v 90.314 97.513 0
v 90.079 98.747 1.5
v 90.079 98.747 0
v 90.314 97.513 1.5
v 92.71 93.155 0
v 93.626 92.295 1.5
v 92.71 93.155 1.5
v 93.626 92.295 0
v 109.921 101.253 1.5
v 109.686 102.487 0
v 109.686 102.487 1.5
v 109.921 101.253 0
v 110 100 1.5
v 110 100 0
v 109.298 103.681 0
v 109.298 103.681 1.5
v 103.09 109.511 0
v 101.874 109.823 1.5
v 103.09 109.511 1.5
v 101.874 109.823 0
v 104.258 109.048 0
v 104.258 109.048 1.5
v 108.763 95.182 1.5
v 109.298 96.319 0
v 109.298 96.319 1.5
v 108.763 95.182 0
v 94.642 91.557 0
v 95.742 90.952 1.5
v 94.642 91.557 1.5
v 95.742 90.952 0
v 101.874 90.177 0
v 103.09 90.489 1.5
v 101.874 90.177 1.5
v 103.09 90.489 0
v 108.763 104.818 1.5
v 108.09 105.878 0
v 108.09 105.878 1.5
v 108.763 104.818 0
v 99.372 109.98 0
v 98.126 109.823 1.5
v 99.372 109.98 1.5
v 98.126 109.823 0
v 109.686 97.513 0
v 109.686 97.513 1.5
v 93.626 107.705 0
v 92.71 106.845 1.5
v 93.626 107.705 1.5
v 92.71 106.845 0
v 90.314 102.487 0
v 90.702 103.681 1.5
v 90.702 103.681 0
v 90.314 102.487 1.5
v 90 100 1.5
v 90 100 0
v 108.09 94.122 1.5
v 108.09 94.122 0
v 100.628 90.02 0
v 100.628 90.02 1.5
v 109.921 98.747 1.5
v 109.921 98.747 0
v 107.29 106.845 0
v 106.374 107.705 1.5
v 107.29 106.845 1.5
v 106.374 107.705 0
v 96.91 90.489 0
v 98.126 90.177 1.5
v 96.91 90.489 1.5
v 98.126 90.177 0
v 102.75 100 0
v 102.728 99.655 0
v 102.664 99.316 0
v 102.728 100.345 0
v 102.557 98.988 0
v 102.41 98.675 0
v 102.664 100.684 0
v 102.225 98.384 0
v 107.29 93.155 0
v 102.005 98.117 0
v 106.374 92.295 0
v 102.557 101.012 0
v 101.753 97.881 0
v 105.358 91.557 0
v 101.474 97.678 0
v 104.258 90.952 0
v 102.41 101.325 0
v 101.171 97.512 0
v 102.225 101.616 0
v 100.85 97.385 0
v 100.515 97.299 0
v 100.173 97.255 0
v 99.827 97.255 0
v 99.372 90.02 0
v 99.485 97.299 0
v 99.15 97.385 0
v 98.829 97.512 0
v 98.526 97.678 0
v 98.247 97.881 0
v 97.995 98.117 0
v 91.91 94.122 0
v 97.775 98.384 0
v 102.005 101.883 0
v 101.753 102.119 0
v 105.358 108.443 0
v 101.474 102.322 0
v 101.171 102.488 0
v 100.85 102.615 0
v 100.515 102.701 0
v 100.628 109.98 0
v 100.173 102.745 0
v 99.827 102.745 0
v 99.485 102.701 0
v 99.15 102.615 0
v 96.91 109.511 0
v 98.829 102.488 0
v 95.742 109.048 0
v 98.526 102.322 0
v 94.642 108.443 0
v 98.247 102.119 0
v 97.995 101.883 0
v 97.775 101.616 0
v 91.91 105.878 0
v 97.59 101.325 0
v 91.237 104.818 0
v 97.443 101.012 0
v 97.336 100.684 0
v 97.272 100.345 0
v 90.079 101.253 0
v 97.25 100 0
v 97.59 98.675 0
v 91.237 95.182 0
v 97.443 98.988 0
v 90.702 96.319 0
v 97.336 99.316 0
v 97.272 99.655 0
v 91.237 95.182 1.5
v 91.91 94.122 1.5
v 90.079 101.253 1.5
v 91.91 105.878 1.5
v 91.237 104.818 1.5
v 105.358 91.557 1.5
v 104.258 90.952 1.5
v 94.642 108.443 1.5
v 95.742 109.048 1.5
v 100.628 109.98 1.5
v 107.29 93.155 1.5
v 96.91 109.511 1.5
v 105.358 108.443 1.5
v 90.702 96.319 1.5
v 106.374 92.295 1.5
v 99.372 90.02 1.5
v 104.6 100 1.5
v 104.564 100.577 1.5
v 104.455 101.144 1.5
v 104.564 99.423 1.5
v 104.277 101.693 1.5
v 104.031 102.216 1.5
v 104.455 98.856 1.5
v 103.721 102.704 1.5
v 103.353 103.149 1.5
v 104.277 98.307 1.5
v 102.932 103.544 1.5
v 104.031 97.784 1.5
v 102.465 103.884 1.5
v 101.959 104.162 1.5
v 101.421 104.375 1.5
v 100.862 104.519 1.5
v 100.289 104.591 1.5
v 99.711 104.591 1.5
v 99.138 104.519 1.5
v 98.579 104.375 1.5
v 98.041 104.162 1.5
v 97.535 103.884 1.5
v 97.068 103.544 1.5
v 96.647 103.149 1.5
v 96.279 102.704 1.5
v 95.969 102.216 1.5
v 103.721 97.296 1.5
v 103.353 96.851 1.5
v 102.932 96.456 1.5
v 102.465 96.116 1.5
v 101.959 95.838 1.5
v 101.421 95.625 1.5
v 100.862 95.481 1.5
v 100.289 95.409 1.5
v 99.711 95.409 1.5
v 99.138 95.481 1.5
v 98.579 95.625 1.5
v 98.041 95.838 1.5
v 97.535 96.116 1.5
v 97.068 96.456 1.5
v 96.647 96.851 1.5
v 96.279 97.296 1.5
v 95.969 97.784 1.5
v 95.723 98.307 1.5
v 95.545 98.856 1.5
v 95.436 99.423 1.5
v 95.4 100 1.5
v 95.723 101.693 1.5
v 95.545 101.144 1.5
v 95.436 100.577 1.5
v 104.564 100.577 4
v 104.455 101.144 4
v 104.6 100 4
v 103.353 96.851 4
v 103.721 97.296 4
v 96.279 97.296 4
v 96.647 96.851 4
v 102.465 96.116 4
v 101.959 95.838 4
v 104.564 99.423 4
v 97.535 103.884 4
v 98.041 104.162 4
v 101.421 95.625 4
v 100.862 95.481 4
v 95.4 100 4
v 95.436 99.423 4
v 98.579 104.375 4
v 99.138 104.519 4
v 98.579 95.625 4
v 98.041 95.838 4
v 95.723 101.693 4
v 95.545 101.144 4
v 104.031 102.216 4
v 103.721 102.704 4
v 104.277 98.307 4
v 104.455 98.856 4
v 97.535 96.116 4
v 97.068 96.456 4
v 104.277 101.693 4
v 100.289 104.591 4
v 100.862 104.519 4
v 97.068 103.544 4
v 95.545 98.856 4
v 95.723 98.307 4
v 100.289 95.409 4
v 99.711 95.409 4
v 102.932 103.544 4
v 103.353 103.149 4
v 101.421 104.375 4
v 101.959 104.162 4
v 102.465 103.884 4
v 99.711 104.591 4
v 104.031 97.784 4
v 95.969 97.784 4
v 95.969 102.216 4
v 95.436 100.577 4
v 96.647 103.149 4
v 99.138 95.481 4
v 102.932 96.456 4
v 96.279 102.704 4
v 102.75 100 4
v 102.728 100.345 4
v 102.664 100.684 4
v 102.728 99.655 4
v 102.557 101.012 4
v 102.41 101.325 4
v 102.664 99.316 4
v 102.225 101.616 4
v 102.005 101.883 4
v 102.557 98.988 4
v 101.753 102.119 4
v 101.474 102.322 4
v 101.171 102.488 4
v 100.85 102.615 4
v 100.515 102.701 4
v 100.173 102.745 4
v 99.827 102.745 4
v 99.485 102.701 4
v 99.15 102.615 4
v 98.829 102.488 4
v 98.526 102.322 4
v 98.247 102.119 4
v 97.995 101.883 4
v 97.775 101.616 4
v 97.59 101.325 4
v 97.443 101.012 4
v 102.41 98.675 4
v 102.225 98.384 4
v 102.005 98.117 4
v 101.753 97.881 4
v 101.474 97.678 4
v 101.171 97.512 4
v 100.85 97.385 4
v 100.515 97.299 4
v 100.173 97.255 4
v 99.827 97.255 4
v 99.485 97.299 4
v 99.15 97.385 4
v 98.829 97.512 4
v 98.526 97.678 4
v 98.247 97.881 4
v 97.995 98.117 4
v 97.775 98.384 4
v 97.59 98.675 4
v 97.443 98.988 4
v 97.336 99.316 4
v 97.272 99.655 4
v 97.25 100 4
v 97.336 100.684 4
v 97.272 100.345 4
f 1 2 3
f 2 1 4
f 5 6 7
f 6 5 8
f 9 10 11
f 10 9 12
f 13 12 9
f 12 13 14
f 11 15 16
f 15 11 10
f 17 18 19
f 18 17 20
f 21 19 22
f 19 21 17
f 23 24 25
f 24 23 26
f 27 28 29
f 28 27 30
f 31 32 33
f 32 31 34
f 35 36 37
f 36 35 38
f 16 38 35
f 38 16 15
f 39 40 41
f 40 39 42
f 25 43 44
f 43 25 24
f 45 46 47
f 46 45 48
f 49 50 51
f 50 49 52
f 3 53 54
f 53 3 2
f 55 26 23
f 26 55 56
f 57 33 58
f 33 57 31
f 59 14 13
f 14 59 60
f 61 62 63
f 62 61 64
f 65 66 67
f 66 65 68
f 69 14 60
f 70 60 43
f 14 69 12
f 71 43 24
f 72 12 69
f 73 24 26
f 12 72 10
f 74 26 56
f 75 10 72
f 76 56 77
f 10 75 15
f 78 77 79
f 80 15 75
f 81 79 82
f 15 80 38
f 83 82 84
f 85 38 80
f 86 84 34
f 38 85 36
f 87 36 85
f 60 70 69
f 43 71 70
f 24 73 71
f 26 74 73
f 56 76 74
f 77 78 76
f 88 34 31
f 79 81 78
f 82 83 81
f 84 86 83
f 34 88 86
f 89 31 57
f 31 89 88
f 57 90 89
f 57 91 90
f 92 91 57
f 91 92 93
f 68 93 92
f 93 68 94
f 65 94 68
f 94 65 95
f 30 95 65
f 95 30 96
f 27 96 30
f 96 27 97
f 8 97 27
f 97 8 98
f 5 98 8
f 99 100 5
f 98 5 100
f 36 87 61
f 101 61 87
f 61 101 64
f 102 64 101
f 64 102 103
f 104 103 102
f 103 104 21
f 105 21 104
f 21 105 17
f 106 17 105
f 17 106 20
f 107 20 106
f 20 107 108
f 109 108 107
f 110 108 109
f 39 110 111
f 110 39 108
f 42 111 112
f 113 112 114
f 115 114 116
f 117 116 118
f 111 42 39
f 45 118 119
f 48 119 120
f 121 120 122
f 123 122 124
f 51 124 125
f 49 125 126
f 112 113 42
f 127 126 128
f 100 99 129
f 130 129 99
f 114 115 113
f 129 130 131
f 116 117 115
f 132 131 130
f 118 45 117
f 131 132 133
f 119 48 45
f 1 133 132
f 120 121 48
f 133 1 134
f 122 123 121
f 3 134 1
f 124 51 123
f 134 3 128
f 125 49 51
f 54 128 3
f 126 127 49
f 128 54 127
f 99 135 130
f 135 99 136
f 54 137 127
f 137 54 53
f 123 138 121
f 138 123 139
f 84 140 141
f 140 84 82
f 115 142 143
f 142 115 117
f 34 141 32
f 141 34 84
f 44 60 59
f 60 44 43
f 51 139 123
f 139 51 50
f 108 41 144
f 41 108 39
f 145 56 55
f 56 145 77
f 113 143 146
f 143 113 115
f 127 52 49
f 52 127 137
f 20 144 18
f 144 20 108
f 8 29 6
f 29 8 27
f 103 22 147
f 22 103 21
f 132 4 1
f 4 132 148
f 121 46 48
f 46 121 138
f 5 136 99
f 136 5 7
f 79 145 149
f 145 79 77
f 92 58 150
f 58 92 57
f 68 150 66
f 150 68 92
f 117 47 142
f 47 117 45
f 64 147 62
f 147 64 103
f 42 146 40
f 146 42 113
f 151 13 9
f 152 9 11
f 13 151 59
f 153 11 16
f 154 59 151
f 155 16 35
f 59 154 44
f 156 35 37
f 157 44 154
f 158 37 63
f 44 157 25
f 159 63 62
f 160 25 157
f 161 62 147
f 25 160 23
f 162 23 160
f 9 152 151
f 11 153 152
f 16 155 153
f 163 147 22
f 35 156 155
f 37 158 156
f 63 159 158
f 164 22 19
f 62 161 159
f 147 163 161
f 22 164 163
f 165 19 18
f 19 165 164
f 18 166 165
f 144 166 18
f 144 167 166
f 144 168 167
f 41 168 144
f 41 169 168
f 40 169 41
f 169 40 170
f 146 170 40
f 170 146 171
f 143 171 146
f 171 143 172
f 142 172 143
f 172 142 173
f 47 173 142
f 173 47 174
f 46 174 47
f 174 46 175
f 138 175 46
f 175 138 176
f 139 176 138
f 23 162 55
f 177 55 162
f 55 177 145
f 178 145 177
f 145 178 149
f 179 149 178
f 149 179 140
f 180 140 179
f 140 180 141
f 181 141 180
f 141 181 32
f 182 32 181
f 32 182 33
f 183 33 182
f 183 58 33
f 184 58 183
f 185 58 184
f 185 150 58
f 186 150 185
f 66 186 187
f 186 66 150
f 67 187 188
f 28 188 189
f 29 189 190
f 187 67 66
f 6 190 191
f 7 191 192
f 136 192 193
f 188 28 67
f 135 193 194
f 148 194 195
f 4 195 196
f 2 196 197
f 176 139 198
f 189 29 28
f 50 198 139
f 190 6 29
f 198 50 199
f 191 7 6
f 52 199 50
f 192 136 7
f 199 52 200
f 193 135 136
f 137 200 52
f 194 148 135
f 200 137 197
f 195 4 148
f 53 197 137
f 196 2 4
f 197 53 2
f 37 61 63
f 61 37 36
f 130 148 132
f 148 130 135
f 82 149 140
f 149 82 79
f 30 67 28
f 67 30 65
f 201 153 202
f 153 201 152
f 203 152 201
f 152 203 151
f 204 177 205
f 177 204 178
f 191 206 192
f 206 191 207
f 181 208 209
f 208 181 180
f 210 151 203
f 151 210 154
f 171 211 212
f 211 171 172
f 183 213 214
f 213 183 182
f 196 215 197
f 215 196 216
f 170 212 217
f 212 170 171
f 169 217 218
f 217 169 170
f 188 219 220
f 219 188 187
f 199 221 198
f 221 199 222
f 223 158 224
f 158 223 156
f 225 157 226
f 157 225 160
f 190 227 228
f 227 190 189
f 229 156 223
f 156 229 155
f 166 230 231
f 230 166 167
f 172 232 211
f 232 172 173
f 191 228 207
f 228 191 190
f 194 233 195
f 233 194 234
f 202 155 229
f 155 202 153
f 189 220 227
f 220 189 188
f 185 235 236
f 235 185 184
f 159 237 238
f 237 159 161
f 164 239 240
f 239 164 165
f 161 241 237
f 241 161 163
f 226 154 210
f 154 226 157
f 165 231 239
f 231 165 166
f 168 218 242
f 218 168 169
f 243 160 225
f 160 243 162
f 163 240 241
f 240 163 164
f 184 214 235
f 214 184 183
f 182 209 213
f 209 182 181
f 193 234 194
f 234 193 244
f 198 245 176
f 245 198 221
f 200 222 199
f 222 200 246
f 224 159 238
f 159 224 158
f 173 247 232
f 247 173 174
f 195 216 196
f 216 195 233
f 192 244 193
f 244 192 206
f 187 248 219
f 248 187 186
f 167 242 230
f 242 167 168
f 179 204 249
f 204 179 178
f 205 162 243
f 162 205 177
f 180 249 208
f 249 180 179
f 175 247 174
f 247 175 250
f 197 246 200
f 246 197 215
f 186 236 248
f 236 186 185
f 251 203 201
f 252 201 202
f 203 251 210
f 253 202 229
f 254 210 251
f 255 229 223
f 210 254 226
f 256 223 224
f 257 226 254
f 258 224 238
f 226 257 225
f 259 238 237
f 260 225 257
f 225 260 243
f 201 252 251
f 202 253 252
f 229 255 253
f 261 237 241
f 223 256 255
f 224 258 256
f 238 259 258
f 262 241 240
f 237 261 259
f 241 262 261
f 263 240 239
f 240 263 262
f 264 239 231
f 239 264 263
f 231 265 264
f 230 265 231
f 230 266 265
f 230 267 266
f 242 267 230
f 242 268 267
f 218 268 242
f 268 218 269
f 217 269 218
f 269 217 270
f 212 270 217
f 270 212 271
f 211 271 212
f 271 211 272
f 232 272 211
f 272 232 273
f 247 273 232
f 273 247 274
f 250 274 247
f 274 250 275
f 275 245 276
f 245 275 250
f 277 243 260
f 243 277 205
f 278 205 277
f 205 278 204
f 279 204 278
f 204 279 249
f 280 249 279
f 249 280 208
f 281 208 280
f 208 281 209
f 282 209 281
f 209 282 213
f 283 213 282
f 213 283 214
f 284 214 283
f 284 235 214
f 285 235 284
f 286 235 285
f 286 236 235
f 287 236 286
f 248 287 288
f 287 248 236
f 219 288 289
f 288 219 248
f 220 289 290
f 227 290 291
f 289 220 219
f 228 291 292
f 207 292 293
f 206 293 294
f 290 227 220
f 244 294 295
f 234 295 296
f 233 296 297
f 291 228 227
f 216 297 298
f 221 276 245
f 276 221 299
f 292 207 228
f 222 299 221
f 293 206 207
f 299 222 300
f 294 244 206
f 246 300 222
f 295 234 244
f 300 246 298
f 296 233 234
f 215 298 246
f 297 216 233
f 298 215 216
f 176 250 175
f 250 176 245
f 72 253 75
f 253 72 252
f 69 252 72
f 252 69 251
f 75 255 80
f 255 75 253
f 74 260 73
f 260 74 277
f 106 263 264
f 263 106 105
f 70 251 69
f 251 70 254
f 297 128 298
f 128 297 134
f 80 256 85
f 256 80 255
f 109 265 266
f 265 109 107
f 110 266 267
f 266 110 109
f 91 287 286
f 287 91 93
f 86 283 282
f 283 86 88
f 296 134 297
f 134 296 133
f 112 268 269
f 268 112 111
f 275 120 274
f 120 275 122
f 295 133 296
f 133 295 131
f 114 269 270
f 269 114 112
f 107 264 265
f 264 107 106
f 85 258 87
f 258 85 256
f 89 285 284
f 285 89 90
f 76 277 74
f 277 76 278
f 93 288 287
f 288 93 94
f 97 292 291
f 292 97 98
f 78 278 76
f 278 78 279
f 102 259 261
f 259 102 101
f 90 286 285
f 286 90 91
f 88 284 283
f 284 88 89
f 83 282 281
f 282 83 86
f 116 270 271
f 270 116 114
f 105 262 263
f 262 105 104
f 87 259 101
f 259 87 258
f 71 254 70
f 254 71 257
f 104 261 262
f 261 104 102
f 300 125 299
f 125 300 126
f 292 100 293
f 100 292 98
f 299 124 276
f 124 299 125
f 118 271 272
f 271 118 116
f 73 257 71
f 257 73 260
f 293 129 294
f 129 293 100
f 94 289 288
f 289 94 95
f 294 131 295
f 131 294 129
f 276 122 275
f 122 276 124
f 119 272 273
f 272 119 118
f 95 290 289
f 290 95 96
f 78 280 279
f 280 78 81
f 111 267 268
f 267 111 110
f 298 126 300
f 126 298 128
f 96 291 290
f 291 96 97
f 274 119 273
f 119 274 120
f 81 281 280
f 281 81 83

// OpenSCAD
//diameter (shaft) [0.1mm]  0 - no hole inside -> use for cap
inner = 55; //[0:60]
    
//diameter (hole in motor body) [0.1mm] 
hole = 92; //[40:150]  
    
//ring [mm]   
outer = 20; //[10:40]   

//ring [0.1mm]
heigh_outer = 15; //[10:40]     

// [0.1mm]
heigh_hole = 25; //[10:40]    

translate([100,100,0])
difference() {
    union(){
        //base ring
        cylinder(heigh_outer/10, d=outer, $fn=50);
        //hole
        cylinder((heigh_outer + heigh_hole)/10, d=hole/10, $fn=50);
    }
    //shaft
    cylinder((heigh_outer + heigh_hole)/10, d=inner/10, $fn=50);
}
